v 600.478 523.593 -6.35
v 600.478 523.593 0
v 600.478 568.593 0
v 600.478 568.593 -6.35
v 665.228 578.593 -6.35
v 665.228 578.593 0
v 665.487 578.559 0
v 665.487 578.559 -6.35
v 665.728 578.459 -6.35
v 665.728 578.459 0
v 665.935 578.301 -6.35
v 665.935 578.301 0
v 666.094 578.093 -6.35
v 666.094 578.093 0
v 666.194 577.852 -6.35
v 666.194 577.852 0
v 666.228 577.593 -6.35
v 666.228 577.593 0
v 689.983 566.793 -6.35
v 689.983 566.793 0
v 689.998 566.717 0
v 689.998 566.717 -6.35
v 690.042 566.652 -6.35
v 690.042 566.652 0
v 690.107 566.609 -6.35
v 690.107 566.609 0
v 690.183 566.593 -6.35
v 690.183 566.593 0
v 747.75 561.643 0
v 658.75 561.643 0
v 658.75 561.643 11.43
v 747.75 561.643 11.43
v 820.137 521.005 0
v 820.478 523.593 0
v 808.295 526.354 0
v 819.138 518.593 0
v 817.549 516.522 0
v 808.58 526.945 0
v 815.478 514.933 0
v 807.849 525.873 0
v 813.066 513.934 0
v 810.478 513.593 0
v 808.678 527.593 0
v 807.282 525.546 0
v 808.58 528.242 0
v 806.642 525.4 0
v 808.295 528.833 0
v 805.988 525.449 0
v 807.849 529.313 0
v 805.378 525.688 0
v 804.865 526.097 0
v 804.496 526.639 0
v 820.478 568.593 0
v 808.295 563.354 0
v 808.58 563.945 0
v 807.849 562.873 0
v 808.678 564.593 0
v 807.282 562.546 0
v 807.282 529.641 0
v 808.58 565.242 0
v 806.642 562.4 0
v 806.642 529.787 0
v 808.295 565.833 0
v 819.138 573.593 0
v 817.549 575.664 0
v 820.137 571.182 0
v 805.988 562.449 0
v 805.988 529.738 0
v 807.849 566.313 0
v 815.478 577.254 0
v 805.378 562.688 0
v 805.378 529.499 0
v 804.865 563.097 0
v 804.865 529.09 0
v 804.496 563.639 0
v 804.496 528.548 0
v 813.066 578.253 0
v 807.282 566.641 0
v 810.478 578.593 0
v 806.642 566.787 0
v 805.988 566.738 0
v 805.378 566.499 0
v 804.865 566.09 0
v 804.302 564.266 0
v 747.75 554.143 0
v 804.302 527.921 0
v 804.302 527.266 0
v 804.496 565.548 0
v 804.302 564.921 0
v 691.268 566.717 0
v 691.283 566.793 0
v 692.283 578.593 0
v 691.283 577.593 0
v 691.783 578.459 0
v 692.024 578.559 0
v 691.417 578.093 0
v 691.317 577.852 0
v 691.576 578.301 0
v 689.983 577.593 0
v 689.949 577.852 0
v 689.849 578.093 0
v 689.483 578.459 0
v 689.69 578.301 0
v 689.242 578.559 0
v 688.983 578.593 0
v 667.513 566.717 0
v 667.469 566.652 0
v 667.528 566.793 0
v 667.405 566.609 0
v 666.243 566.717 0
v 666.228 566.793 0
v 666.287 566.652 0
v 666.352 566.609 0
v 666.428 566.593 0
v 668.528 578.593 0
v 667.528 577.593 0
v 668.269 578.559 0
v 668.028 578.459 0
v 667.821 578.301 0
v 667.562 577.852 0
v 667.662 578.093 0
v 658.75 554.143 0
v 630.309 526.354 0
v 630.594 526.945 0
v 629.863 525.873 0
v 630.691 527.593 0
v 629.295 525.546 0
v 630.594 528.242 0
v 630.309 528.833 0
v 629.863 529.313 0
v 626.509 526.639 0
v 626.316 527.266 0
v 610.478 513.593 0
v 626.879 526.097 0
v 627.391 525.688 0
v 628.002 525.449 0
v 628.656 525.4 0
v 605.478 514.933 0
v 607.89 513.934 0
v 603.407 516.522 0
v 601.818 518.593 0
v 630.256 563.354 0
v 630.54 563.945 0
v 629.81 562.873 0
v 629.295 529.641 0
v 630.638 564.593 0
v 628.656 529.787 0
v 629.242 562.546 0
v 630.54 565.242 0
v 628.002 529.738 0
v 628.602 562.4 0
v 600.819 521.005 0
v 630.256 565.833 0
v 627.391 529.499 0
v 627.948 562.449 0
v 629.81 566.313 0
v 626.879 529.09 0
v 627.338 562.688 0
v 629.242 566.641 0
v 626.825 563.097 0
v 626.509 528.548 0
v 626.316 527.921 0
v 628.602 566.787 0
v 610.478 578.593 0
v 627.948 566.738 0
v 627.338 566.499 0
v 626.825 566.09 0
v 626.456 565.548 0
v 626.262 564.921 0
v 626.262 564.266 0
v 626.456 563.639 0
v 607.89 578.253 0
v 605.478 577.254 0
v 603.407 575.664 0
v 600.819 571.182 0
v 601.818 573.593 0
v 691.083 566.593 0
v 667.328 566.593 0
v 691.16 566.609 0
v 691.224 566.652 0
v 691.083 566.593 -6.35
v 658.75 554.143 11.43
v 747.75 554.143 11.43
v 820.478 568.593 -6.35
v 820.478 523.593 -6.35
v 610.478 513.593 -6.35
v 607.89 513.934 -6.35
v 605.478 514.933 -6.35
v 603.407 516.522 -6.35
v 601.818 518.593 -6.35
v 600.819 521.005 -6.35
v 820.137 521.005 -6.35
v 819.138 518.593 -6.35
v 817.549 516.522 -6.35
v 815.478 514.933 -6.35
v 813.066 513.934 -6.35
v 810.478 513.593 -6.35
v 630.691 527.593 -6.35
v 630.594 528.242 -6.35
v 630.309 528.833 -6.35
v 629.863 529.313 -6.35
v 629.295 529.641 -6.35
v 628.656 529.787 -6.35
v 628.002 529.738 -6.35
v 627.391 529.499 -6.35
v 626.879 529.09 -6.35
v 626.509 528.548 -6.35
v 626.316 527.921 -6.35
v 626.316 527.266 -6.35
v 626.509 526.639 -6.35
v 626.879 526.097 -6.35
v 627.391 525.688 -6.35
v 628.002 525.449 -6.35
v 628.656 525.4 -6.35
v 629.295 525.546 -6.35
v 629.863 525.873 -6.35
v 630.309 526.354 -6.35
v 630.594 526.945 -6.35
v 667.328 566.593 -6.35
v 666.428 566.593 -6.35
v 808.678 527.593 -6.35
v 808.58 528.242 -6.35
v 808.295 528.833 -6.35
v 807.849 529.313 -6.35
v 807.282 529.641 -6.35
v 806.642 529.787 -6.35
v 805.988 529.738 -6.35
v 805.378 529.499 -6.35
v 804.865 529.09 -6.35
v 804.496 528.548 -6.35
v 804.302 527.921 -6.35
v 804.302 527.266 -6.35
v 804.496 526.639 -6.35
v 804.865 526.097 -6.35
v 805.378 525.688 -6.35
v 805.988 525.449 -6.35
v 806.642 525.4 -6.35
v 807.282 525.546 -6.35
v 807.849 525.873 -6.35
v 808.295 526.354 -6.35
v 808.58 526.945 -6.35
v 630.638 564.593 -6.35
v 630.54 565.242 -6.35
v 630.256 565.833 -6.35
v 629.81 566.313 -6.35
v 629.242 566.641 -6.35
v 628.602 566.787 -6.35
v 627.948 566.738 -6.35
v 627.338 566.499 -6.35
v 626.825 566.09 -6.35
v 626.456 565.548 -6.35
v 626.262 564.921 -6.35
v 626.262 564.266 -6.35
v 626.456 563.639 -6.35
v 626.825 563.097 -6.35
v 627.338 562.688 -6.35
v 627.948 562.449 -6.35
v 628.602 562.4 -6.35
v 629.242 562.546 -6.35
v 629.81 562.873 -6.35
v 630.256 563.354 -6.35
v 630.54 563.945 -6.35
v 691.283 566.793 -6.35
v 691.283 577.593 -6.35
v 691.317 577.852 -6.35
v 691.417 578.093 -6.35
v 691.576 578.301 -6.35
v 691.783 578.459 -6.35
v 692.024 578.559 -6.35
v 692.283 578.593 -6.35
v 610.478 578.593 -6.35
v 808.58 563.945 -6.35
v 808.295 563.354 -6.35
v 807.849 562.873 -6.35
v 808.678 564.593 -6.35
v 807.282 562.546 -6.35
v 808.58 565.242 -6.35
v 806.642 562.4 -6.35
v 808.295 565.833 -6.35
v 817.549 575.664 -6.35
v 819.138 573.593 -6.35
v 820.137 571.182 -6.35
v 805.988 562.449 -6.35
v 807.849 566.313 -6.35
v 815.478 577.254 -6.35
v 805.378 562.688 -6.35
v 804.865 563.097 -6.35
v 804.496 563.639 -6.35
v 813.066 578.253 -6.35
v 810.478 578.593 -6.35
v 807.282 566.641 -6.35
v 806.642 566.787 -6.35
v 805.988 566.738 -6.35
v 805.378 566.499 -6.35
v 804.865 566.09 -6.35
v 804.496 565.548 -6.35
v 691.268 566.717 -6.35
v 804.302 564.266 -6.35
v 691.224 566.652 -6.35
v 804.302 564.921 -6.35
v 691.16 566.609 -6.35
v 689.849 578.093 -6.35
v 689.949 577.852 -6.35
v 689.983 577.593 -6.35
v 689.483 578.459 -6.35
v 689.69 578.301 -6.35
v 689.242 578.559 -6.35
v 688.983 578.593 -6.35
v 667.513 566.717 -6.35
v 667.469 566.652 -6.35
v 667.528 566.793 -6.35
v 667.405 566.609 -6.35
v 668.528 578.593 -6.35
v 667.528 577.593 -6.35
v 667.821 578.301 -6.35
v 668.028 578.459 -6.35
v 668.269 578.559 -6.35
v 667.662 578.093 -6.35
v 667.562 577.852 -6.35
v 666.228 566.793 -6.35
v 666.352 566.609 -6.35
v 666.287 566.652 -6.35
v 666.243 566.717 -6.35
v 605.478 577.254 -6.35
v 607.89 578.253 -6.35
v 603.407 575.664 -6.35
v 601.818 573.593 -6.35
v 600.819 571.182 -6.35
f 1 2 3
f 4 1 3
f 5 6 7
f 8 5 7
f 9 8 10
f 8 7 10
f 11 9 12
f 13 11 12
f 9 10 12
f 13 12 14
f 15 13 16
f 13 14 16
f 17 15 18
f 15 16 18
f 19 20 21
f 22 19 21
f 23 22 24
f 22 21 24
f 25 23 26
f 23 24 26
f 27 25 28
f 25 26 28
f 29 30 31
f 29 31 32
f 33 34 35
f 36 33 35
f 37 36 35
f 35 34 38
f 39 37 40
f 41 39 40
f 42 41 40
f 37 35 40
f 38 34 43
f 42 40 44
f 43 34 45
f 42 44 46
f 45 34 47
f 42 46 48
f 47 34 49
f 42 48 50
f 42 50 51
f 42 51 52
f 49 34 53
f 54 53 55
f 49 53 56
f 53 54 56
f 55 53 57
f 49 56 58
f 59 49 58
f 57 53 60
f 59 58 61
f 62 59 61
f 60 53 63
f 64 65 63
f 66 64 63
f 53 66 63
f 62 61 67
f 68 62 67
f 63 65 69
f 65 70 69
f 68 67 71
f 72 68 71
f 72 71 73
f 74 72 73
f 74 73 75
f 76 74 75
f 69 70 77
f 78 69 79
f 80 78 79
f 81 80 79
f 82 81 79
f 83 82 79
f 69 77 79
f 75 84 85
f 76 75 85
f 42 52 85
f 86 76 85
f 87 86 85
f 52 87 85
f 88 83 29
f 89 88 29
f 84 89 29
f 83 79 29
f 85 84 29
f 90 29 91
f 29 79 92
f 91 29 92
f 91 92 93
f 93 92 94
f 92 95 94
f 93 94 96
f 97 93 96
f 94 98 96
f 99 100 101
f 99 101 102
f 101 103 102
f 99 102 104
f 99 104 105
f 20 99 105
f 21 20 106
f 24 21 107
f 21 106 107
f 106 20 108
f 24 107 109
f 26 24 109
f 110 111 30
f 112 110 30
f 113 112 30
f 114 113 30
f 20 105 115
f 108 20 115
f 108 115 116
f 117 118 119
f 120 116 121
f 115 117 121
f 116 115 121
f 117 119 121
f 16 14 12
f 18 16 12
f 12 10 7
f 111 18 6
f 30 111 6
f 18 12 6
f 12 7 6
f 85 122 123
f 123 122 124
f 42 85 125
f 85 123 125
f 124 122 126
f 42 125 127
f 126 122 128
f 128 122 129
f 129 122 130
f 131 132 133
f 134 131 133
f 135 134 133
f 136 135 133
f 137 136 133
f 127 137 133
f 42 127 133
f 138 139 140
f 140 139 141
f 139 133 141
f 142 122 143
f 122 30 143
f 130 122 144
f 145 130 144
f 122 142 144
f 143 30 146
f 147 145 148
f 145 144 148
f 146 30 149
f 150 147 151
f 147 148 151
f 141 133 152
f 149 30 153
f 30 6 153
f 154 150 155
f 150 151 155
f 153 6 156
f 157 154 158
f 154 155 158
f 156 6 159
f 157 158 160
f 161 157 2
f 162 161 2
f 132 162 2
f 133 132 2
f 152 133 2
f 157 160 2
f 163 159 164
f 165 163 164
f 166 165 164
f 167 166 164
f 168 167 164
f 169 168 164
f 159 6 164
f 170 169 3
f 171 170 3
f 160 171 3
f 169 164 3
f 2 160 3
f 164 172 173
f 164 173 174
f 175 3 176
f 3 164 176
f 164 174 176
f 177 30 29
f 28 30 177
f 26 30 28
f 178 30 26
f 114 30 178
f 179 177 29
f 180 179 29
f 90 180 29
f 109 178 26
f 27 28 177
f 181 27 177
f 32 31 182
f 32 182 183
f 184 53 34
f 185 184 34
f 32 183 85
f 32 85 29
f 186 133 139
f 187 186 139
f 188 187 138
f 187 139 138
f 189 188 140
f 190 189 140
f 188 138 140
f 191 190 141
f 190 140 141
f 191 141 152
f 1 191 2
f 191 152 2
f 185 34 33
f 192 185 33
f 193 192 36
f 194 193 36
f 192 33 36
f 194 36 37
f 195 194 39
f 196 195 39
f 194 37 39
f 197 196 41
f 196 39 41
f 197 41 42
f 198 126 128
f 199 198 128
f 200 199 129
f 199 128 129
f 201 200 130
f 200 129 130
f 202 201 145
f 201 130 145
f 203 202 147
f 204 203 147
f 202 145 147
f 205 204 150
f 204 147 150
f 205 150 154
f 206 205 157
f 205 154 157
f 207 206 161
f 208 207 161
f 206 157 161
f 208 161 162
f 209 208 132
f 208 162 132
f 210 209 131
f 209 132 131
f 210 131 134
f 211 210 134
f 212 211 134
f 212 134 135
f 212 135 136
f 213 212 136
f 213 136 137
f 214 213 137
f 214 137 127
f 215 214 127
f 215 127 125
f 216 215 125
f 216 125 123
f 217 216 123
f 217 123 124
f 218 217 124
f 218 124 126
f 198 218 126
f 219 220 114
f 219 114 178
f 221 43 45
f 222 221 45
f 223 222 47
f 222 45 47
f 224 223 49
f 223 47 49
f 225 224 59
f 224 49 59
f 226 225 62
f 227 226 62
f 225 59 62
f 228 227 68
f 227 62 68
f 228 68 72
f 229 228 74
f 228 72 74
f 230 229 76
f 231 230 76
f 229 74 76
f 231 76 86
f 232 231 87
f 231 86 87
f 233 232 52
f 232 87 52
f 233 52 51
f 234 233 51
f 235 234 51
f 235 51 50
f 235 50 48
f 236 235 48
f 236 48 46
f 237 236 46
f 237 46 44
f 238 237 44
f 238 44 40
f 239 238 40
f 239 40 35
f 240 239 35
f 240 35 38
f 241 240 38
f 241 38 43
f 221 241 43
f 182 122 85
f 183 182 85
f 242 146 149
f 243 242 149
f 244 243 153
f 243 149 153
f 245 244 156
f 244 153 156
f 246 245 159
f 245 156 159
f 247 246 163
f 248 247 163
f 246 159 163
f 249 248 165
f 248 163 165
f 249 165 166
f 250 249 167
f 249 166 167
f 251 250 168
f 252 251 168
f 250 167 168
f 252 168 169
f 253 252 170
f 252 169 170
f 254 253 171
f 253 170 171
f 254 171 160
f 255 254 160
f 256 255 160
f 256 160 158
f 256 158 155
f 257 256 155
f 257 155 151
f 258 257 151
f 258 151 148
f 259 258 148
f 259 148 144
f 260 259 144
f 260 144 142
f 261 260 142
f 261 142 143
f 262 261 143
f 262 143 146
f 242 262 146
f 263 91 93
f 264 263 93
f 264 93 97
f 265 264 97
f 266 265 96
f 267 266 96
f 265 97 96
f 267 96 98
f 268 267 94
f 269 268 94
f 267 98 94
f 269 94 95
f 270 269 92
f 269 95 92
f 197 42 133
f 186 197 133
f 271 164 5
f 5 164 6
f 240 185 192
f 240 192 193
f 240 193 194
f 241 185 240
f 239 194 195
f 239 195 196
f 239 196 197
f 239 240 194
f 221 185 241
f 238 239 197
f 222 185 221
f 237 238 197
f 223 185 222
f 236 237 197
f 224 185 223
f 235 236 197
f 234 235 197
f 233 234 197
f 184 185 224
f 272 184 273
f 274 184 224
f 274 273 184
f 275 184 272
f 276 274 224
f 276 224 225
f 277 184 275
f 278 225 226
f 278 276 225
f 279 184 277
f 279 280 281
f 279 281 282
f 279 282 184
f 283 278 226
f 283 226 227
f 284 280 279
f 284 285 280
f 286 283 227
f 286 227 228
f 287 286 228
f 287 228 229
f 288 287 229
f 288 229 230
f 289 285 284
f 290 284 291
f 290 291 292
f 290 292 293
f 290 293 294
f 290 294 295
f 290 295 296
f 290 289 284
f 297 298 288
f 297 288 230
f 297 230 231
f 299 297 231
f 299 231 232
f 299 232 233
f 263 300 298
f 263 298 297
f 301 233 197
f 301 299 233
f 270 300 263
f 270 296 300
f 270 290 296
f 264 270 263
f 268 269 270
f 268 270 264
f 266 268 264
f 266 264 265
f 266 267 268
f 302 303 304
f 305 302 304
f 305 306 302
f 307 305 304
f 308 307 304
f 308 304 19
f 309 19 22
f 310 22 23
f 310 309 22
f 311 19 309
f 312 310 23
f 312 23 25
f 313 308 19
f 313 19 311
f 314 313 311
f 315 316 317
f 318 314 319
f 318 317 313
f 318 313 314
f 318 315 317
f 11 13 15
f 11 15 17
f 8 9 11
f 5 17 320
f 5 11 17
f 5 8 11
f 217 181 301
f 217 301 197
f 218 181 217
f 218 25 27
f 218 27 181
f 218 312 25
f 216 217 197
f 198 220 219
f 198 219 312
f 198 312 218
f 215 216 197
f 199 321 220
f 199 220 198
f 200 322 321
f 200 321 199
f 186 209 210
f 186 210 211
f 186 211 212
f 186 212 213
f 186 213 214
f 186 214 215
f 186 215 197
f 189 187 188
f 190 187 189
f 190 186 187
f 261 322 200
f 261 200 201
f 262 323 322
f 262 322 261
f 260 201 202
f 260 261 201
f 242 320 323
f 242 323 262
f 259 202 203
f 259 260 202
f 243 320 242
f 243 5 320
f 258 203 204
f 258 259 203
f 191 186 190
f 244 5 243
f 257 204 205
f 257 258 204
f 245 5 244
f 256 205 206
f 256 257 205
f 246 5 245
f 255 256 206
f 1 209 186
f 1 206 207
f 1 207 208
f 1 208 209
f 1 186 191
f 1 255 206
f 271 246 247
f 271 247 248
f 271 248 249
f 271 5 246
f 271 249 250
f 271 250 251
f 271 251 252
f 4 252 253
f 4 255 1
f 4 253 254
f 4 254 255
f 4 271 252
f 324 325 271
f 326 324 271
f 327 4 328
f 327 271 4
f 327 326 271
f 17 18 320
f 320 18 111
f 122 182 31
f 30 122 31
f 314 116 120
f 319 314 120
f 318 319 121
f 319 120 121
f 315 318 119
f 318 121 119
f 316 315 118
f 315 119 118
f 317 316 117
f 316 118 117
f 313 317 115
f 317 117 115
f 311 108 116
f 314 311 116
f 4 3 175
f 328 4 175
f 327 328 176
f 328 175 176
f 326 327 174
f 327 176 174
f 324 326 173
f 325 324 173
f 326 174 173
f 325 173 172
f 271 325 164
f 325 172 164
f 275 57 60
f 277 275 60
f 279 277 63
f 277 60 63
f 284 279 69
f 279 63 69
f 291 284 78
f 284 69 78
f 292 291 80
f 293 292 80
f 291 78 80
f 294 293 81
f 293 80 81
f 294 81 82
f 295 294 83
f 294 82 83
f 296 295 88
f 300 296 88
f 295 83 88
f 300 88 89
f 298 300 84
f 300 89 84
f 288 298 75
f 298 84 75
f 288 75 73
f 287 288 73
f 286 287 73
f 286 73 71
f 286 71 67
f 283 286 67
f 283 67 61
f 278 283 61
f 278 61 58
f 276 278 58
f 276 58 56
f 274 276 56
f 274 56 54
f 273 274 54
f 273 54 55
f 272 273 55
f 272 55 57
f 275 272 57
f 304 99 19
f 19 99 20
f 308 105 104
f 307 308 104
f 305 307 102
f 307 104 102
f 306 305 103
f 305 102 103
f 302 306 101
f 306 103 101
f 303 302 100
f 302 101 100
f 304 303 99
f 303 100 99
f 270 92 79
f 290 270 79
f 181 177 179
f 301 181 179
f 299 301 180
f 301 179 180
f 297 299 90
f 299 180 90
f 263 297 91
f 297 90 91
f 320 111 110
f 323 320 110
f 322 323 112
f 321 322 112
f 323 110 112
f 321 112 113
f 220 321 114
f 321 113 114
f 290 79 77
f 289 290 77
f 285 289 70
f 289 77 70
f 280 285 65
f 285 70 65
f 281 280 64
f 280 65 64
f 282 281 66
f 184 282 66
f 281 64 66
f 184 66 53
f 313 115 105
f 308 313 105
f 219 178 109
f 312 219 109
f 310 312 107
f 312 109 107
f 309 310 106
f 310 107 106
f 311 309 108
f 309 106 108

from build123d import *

# Parameters (mm, degrees)
BOSS_EXTRUDE1_DEPTH = 6.35
SKETCH2_R           = 2.20000068
CUT_EXTRUDE1_DEPTH  = 1004.989260418
SKETCH3_W           = 88.9999998
SKETCH3_H           = 7.4999977
BOSS_EXTRUDE2_DEPTH = 11.43


with BuildPart() as part:
    # 3DSketch1 → Boss-Extrude1 (new body)
    with BuildSketch(Plane(origin=(600.47776272, 523.59342576, 0), x_dir=(0.9797149309198314, 0.20039624281096213, 0), z_dir=(0, 0, 1))):
        with BuildLine():
            Line((0, 0), (9.017831215, 44.087173302))
            ThreePointArc((9.017831215, 44.087173302), (13.304365371, 50.427857212), (20.81894333, 51.880360433))
            Line((20.81894333, 51.880360433), (74.458631652, 40.908605623))
            ThreePointArc((74.458631652, 40.908605623), (75.092700365, 40.47995199), (75.237950761, 39.728493812))
            Line((75.237950761, 39.728493812), (73.073671595, 29.147573812))
            ThreePointArc((73.073671595, 29.147573812), (73.102720392, 28.99728113), (73.229534512, 28.911549561))
            Line((73.229534512, 28.911549561), (74.111278675, 28.731192794))
            ThreePointArc((74.111278675, 28.731192794), (74.261570989, 28.760243499), (74.347300947, 28.887058709))
            Line((74.347300947, 28.887058709), (76.511580113, 39.467978708))
            ThreePointArc((76.511580113, 39.467978708), (76.940233746, 40.102047422), (77.691691924, 40.247297817))
            Line((77.691691924, 40.247297817), (97.731759327, 36.148192979))
            ThreePointArc((97.731759327, 36.148192979), (98.36582804, 35.719539346), (98.511078436, 34.968081168))
            Line((98.511078436, 34.968081168), (96.34679927, 24.387161168))
            ThreePointArc((96.34679927, 24.387161168), (96.375848066, 24.236868486), (96.502662187, 24.151136917))
            Line((96.502662187, 24.151136917), (97.38440635, 23.97078015))
            ThreePointArc((97.38440635, 23.97078015), (97.534698663, 23.999830856), (97.620428621, 24.126646065))
            Line((97.620428621, 24.126646065), (99.784707787, 34.707566065))
            ThreePointArc((99.784707787, 34.707566065), (100.21336142, 35.341634778), (100.964819598, 35.486885174))
            Line((100.964819598, 35.486885174), (216.761930807, 11.801111606))
            ThreePointArc((216.761930807, 11.801111606), (223.102612928, 7.514576899), (224.555115449, 0))
            Line((224.555115449, 0), (215.537284234, -44.087173302))
            ThreePointArc((215.537284234, -44.087173302), (211.250750587, -50.427854723), (203.736175117, -51.880358453))
            Line((203.736175117, -51.880358453), (7.793187639, -11.801109626))
            ThreePointArc((7.793187639, -11.801109626), (1.45250443, -7.514576531), (0, 0))
        make_face()
    extrude(amount=-BOSS_EXTRUDE1_DEPTH)

    # Sketch2 → Cut-Extrude1 (cut, through all)
    with BuildSketch(Plane.XY):
        with Locations((806.4777622, 527.59342792)):
            Circle(SKETCH2_R)
        with Locations((806.47776474, 564.59342758)):
            Circle(SKETCH2_R)
        with Locations((628.49137192, 527.59342792)):
            Circle(SKETCH2_R)
        with Locations((628.43782872, 564.59342758)):
            Circle(SKETCH2_R)
    extrude(amount=-CUT_EXTRUDE1_DEPTH, mode=Mode.SUBTRACT)

    # Sketch3 → Boss-Extrude2 (add)
    with BuildSketch(Plane.XY):
        with Locations((703.25022672, 557.89342701)):
            Rectangle(SKETCH3_W, SKETCH3_H)
    extrude(amount=BOSS_EXTRUDE2_DEPTH)


solid = part.part
